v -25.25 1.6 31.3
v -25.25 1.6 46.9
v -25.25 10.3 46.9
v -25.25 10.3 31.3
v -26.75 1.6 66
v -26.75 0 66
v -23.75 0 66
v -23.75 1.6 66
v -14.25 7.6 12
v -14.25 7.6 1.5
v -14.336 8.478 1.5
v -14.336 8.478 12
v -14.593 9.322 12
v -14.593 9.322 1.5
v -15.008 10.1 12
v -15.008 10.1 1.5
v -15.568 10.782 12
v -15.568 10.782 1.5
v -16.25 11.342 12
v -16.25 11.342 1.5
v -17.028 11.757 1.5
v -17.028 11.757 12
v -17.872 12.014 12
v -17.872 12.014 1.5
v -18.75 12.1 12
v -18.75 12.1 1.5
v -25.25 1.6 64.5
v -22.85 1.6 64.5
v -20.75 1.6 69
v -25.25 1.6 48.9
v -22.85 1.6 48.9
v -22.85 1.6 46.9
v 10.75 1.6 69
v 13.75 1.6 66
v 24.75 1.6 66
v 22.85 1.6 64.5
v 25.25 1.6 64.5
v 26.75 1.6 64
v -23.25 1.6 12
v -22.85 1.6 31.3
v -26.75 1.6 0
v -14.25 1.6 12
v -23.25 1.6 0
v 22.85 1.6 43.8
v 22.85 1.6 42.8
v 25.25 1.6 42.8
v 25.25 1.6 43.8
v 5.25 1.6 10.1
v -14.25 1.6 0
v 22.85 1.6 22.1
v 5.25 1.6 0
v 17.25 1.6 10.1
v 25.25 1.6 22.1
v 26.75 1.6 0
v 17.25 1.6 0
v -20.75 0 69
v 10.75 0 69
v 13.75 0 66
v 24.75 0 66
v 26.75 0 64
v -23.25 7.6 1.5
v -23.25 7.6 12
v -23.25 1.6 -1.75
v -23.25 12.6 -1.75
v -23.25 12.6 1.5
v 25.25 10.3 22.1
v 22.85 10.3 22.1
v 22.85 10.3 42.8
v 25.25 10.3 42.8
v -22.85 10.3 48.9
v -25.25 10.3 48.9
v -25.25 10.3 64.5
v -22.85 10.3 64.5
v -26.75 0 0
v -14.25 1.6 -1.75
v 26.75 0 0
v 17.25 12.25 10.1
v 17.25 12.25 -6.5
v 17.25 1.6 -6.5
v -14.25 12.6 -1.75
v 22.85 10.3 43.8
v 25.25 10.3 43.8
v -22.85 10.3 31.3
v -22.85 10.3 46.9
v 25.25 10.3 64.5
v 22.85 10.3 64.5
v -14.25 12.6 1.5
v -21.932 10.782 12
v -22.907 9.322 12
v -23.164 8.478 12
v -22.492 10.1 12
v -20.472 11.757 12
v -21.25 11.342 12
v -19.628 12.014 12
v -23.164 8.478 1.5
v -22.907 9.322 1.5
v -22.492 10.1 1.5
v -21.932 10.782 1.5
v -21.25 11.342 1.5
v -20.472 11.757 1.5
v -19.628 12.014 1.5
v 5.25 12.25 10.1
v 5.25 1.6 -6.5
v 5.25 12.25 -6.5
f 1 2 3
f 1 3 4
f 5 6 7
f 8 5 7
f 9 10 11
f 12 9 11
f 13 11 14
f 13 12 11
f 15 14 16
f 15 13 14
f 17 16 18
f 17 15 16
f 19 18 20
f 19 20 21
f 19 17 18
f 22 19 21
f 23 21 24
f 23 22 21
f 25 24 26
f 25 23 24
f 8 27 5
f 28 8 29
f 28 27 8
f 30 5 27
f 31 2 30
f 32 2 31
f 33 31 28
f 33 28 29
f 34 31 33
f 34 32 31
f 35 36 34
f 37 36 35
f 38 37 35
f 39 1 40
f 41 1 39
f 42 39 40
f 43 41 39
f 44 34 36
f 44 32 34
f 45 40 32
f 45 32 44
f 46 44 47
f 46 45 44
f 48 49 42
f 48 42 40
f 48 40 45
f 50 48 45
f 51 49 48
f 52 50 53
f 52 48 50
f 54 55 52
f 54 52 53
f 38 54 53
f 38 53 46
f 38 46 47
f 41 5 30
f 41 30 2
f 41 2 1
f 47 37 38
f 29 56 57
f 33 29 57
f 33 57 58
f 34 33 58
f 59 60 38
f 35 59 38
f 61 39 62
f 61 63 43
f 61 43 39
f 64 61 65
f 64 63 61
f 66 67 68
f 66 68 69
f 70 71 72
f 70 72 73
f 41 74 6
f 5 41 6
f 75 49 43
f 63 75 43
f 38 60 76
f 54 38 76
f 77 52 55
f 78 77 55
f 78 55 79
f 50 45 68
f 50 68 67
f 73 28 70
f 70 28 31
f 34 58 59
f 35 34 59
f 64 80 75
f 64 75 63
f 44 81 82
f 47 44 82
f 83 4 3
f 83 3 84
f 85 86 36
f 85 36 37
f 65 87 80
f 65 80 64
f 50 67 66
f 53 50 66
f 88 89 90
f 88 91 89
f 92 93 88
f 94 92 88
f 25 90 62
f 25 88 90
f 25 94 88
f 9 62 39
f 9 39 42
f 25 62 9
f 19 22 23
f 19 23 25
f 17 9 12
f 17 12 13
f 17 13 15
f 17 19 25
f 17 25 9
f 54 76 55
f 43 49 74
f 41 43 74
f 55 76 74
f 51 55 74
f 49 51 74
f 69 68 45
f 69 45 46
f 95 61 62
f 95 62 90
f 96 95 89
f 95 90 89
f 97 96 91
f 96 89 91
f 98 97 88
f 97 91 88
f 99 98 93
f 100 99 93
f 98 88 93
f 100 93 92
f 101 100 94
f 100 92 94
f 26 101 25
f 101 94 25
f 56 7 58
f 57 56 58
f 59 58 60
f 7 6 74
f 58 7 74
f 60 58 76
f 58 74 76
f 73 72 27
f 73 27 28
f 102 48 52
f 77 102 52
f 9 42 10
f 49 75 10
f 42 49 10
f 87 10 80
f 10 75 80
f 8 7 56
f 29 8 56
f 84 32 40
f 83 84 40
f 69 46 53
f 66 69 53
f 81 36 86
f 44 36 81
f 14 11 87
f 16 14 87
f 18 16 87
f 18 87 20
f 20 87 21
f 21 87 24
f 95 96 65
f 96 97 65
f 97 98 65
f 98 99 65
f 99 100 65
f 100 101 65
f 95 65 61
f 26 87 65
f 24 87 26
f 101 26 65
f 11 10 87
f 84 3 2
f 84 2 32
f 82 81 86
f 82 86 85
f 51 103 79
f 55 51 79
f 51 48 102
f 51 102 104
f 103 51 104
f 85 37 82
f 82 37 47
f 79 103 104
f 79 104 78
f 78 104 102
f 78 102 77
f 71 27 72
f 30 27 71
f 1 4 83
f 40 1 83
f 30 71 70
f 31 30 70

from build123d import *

# Parameters (mm, degrees)
BOSS_EXTRUDE1_DEPTH      = 1.6
CHAMFER1_SIZE            = 2
SKETCH2_W                = 12
SKETCH2_H                = 16.6
BOSS_EXTRUDE2_DEPTH      = 10.65
SKETCH3_W                = 2.4
SKETCH3_H                = 15.6
SKETCH3_H_2              = 20.7
BOSS_EXTRUDE3_DEPTH      = 8.7
BOSS_EXTRUDE4_DEPTH      = 1.75
BOSS_EXTRUDE4_DEPTH_BACK = 1.5
SKETCH4_W                = 9
SKETCH4_H                = 11
SKETCH5_W                = 9
SKETCH5_H                = 10.5
BOSS_EXTRUDE5_DEPTH      = 10.5
FILLET1_R                = 4.5


with BuildPart() as part:
    # Sketch1 → Boss-Extrude1 (new body)
    with BuildSketch(Plane(origin=(0, 0, 0), x_dir=(1, 0, 0), z_dir=(0, 1, 0))):
        Polygon((-26.75, -66), (-23.75, -66), (-20.75, -69), (10.75, -69), (13.75, -66), (26.75, -66), (26.75, 0), (-26.75, 0), align=None)
    extrude(amount=BOSS_EXTRUDE1_DEPTH)

    # Chamfer1
    chamfer1_edges = [part.edges().sort_by_distance(p)[0] for p in [
        (26.75, 0.8, 66),
    ]]
    chamfer(chamfer1_edges, length=CHAMFER1_SIZE)

    # Sketch2 → Boss-Extrude2 (add)
    with BuildSketch(Plane(origin=(0, 1.6, 0), x_dir=(1, 0, 0), z_dir=(0, 1, 0))):
        with Locations((11.25, -1.8)):
            Rectangle(SKETCH2_W, SKETCH2_H)
    extrude(amount=BOSS_EXTRUDE2_DEPTH)

    # Sketch3 → Boss-Extrude3 (add)
    with BuildSketch(Plane(origin=(0, 1.6, 0), x_dir=(1, 0, 0), z_dir=(0, 1, 0))):
        with Locations((-24.05, -56.7)):
            Rectangle(SKETCH3_W, SKETCH3_H)
        with Locations((-24.05, -39.1)):
            Rectangle(SKETCH3_W, SKETCH3_H)
        with Locations((24.05, -54.15)):
            Rectangle(SKETCH3_W, SKETCH3_H_2)
        with Locations((24.05, -32.45)):
            Rectangle(SKETCH3_W, SKETCH3_H_2)
    extrude(amount=BOSS_EXTRUDE3_DEPTH)

    # Sketch4 → Boss-Extrude4 (add, two sides: drawn at the far end of the back side and taken through both)
    with BuildSketch(Plane(origin=(0, 0, 0), x_dir=(-1, 0, 0), z_dir=(0, 0, -1)).offset(-BOSS_EXTRUDE4_DEPTH_BACK)):
        with Locations((18.75, 7.1)):
            Rectangle(SKETCH4_W, SKETCH4_H)
    extrude(amount=BOSS_EXTRUDE4_DEPTH + BOSS_EXTRUDE4_DEPTH_BACK)

    # Sketch5 → Boss-Extrude5 (add)
    with BuildSketch(Plane.XY.offset(1.5)):
        with Locations((-18.75, 6.85)):
            Rectangle(SKETCH5_W, SKETCH5_H)
    extrude(amount=BOSS_EXTRUDE5_DEPTH)

    # Fillet1
    fillet1_edges = [part.edges().sort_by_distance(p)[0] for p in [
        (-14.25, 12.1, 6.75),
        (-23.25, 12.1, 6.75),
    ]]
    fillet(fillet1_edges, radius=FILLET1_R - 0.0001)  # a hair under: the kernel refuses the full size


solid = part.part
